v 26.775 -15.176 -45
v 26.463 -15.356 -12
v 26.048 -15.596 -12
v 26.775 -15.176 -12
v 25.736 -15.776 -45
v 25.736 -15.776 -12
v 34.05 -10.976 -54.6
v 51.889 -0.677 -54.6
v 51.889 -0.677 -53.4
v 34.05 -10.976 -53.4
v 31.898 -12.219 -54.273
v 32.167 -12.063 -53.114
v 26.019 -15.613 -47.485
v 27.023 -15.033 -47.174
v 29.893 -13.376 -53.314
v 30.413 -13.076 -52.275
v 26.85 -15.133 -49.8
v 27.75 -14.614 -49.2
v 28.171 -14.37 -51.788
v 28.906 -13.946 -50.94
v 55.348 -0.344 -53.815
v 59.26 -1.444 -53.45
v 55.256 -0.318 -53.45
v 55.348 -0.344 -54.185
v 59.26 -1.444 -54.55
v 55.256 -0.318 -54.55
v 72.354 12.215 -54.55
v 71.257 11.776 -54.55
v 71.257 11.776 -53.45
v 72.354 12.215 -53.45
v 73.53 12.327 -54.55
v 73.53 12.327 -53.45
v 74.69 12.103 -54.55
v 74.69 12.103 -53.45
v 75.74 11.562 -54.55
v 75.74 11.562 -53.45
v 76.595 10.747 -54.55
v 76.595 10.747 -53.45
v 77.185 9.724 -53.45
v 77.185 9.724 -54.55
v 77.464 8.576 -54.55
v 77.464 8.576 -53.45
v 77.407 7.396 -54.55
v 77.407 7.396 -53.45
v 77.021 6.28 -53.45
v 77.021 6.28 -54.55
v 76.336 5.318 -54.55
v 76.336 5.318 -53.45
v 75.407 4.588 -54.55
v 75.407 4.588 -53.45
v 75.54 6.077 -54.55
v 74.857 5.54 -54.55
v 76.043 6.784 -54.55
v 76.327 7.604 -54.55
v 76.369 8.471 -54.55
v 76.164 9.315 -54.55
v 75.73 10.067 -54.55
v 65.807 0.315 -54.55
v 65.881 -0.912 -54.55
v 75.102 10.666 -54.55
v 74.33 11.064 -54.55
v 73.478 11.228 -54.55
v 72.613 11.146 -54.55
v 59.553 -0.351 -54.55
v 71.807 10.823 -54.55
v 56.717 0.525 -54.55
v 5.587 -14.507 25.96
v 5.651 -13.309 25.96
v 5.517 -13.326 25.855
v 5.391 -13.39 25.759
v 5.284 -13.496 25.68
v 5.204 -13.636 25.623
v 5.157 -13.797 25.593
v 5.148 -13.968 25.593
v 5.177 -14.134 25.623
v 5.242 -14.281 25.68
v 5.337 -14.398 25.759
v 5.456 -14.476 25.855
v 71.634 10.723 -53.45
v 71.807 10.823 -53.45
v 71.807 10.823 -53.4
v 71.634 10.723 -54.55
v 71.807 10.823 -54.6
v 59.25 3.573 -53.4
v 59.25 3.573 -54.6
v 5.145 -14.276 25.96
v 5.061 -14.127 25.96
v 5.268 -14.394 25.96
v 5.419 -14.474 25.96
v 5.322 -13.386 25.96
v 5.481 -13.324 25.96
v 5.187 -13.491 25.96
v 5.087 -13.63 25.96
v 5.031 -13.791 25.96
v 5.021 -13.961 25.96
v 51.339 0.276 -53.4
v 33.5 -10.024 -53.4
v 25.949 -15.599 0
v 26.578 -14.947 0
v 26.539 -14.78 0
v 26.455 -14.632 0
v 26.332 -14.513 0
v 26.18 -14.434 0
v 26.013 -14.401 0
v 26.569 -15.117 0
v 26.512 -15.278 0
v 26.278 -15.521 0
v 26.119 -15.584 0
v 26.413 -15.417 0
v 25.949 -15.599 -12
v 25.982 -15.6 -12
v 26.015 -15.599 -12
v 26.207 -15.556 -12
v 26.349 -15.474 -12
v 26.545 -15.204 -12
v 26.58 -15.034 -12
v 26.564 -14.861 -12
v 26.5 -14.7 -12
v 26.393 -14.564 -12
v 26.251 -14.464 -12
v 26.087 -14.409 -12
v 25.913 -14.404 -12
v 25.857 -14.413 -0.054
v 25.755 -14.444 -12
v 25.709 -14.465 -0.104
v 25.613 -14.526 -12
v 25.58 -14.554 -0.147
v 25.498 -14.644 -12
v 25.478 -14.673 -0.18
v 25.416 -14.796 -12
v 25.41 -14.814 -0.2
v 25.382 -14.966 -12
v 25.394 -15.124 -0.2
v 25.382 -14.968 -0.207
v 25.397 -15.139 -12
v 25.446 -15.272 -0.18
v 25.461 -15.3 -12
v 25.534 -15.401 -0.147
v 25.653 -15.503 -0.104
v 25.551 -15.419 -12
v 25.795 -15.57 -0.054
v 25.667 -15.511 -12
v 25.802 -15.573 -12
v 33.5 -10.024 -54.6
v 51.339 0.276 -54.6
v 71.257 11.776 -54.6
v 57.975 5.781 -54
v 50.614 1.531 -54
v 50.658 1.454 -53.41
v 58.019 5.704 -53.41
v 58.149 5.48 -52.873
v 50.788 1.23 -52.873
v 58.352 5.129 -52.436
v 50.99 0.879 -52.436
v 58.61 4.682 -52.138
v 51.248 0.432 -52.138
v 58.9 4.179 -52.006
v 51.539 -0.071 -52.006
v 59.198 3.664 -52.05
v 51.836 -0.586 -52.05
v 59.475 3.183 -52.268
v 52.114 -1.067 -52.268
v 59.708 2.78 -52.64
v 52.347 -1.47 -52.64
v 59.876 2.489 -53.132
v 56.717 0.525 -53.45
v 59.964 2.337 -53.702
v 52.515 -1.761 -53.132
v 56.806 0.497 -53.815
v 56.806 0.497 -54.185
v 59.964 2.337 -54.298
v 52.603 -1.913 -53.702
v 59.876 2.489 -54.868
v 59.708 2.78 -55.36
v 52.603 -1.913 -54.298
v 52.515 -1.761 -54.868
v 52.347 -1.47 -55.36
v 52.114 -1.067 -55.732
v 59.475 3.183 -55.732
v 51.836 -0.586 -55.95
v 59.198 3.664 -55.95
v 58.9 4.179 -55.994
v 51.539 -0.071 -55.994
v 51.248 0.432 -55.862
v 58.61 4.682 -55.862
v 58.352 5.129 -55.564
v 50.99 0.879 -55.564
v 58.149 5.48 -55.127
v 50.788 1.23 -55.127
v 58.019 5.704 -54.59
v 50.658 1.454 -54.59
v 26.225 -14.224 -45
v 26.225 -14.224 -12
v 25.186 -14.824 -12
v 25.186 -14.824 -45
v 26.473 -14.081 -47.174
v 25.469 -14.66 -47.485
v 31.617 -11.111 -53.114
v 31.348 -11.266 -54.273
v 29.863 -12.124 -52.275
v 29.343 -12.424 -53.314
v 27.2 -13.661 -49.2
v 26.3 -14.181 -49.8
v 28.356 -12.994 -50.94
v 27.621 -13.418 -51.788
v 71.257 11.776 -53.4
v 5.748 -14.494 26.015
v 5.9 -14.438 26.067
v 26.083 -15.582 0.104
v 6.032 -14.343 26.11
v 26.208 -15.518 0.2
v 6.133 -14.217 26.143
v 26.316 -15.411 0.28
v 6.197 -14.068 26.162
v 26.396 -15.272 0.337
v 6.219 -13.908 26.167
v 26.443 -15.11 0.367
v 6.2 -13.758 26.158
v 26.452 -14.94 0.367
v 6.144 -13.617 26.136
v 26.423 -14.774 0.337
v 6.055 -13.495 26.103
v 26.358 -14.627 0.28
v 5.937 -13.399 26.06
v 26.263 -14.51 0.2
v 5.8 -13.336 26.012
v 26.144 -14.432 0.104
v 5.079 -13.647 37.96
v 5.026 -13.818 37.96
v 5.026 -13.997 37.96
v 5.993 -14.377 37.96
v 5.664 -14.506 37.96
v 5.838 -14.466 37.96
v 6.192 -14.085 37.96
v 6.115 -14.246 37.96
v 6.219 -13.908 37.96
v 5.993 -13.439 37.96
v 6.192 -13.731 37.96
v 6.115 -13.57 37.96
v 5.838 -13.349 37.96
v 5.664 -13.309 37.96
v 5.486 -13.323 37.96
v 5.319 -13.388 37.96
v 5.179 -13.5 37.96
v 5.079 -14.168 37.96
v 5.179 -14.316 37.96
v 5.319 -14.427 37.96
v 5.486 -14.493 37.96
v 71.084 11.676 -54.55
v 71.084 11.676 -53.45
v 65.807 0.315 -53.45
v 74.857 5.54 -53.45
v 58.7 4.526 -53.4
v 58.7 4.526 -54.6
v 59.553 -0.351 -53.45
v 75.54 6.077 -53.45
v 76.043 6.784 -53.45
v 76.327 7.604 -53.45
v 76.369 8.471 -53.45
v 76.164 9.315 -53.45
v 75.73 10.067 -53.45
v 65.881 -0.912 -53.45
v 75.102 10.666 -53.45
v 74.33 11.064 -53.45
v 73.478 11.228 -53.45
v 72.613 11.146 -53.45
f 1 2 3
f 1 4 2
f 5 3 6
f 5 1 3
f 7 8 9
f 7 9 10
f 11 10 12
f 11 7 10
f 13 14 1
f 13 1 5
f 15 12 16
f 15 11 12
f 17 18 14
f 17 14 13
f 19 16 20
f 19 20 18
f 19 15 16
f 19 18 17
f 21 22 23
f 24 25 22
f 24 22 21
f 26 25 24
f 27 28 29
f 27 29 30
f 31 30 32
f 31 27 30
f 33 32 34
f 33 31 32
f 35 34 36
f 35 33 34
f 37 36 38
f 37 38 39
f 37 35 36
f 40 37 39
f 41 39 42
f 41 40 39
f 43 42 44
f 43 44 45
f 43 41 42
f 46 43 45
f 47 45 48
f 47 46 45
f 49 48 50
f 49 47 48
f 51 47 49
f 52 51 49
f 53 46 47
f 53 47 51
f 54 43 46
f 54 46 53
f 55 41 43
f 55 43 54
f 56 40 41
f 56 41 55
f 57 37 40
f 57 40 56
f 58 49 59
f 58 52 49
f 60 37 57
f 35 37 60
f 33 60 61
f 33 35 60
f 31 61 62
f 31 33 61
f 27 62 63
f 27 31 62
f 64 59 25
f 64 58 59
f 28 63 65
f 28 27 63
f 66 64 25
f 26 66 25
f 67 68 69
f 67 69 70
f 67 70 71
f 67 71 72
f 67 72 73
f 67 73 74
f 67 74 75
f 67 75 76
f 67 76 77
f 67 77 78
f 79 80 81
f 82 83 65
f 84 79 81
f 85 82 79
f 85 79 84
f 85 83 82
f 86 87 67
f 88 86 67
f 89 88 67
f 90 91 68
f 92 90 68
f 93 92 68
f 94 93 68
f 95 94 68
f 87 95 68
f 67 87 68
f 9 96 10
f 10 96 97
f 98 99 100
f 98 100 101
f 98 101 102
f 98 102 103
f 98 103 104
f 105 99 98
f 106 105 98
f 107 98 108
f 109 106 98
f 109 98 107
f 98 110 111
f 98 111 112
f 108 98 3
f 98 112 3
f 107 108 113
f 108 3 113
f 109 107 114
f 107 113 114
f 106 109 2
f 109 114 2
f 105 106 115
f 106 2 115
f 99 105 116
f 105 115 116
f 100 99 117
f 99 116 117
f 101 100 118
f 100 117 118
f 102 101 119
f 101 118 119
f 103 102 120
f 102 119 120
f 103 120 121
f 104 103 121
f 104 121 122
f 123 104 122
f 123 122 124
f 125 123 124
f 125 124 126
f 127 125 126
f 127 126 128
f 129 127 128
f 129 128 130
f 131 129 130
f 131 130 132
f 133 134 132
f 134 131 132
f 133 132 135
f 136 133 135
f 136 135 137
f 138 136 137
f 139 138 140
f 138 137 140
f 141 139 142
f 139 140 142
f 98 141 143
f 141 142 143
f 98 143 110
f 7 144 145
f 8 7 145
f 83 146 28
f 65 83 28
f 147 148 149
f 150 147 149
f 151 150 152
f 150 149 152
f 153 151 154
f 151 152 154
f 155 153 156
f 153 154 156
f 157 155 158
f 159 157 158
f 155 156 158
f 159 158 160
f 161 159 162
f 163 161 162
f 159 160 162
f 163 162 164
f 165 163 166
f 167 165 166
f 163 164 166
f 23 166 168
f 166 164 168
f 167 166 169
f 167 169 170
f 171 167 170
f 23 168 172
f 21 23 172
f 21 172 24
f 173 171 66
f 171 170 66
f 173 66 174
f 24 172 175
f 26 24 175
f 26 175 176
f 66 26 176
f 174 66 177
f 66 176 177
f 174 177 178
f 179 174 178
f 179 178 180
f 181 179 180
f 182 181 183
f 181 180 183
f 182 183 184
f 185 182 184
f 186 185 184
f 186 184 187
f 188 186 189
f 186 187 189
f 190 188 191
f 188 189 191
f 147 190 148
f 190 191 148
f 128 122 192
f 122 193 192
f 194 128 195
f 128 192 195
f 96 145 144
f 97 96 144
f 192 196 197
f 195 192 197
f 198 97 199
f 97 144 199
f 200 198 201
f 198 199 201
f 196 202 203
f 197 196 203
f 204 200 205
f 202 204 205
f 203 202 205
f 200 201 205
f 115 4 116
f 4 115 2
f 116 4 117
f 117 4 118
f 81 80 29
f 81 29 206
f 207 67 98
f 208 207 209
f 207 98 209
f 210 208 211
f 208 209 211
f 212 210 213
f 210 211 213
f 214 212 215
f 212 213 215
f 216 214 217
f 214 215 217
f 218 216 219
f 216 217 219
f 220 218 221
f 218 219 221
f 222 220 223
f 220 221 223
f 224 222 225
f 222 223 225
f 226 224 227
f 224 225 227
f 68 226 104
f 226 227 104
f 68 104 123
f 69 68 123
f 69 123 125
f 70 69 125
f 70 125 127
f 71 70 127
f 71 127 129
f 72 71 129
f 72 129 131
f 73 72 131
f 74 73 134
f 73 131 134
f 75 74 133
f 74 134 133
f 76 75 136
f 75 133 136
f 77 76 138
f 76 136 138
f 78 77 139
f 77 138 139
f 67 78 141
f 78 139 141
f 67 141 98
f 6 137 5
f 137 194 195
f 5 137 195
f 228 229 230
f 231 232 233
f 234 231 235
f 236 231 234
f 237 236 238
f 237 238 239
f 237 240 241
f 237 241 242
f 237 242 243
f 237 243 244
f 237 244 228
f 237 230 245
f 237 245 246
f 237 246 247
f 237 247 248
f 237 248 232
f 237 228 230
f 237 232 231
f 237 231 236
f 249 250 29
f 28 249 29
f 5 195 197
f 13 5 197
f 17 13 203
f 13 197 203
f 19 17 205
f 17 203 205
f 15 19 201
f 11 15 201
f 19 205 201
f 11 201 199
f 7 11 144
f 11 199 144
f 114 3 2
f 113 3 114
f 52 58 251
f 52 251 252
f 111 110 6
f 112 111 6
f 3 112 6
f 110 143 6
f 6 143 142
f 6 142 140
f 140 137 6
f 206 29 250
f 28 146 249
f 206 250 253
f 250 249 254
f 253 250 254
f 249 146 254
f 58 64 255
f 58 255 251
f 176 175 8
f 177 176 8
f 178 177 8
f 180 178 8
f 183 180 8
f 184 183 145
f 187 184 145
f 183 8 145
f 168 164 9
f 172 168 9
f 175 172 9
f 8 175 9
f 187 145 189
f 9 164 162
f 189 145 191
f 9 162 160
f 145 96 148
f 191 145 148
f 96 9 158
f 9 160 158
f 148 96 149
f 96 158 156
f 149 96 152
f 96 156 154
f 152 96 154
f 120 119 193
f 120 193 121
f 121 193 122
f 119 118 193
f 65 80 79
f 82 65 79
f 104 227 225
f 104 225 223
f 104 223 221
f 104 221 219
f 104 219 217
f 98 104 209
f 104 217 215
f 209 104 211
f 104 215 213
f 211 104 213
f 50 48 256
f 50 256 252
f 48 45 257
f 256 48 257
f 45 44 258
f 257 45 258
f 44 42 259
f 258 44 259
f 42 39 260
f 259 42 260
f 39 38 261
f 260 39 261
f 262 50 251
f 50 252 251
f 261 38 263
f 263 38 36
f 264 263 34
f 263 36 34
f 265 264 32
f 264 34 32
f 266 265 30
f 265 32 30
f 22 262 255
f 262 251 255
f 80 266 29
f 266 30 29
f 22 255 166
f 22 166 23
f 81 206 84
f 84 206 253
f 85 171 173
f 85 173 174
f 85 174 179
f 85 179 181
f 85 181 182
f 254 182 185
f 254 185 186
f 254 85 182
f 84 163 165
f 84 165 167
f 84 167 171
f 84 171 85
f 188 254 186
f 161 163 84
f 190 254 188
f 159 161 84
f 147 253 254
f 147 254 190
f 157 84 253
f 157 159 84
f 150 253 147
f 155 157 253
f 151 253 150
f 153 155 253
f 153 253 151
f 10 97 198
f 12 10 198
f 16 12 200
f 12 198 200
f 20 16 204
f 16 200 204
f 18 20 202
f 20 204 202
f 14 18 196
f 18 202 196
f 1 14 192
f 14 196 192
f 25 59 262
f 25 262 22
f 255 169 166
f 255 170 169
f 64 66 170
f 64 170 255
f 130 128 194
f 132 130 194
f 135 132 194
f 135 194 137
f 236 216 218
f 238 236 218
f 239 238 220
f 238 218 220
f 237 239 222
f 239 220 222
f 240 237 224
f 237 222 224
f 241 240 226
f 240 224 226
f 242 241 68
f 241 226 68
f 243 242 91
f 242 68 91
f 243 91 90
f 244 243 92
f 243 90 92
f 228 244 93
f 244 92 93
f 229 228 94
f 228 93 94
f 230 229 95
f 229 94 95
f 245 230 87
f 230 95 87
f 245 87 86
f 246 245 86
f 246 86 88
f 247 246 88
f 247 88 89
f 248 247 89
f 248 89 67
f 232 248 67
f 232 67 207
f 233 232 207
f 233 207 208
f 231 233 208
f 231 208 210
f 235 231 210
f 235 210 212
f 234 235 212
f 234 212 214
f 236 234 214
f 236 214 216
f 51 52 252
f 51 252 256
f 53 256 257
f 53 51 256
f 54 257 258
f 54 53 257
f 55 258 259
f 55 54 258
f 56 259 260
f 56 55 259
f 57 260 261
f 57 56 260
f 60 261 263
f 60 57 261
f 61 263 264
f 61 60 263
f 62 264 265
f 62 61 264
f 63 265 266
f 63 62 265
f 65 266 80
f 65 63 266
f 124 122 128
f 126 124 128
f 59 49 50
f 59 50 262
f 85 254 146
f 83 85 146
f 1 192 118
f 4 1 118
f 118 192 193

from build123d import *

# Parameters (mm, degrees)
S01_TENDON_CAPTIVE_TAIL_R                      = 0.6
F_01_TENDON_CAPTIVE_TAIL_DEPTH                 = 12
S02_CROSSED_TENDON_R                           = 0.6
F_02_CROSSED_TENDON_DEPTH                      = 33.010681761
S03_TENDON_THROUGH_REAR_GROMMET_R              = 0.6
F_03_TENDON_THROUGH_REAR_GROMMET_DEPTH         = 12
F_04_START                                     = -0.55
F_04_TENDON_RETURN_DEPTH                       = 1.1
F_05_START                                     = -0.55
F_05_REMOVABLE_BACKED_EYE_AROUND_POLISHE_DEPTH = 1.1
S06_DRESSED_EYE_KNOT_ENVELOPE_R                = 2
F_06_DRESSED_EYE_KNOT_ENVELOPE_DEPTH           = 8.5


with BuildPart() as part:
    # S01 - Tendon captive tail → 01 - Tendon captive tail (new body)
    with BuildSketch(Plane.XY.offset(25.959868809)):
        with Locations((5.619098901, -13.907757819)):
            Circle(S01_TENDON_CAPTIVE_TAIL_R)
    extrude(amount=F_01_TENDON_CAPTIVE_TAIL_DEPTH)

    # S02 - Crossed tendon → 02 - Crossed tendon (add)
    with BuildSketch(Plane(origin=(10.190970454, -0.54666496, -12.992860813), x_dir=(0.7871038979441459, 0.025929320968004606, 0.6162752016390648), z_dir=(-0.6168204388970357, 0.0330875378277926, 0.7864081389452698))):
        with Locations(Location((20.060619317, -14.986740778, 0), (0, 0, 266.097812634))):
            Circle(S02_CROSSED_TENDON_R)
    extrude(amount=F_02_CROSSED_TENDON_DEPTH)

    # S03 - Tendon through rear grommet → 03 - Tendon through rear grommet (add)
    with BuildSketch(Plane.XY.offset(-12)):
        with Locations(Location((25.980762114, -15, 0), (0, 0, 266.929477468))):
            Circle(S03_TENDON_THROUGH_REAR_GROMMET_R)
    extrude(amount=F_03_TENDON_THROUGH_REAR_GROMMET_DEPTH)

    # S04 - Tendon return → 04 - Tendon return (add)
    with BuildSketch(Plane(origin=(12.990381057, -22.5, 0), x_dir=(-0.8660254037844386, -0.5000000000000003, 0), z_dir=(0.5000000000000003, -0.8660254037844386, 0)).offset(F_04_START)):
        with BuildLine():
            Line((-14.4, 12), (-14.4, 45))
            ThreePointArc((-14.4, 45), (-17.211774901, 51.788225099), (-24, 54.6))
            Line((-24, 54.6), (-67.598500564, 54.6))
            Line((-67.598500564, 54.6), (-67.598500564, 53.4))
            Line((-67.598500564, 53.4), (-24, 53.4))
            ThreePointArc((-24, 53.4), (-18.060303038, 50.939696962), (-15.6, 45))
            Line((-15.6, 45), (-15.6, 12))
            Line((-15.6, 12), (-14.4, 12))
        make_face()
    extrude(amount=F_04_TENDON_RETURN_DEPTH)

    # S05 - Removable backed eye around polished clevis sleeve → 05 - Removable backed eye around polished clevis sleeve (add)
    with BuildSketch(Plane.XY.offset(-54).offset(F_05_START)):
        with BuildLine():
            Line((71.084194722, 11.675564254), (71.257399803, 11.775564254))
            ThreePointArc((71.257399803, 11.775564254), (76.926405229, 10.256558829), (75.407399803, 4.587553403))
            Line((75.407399803, 4.587553403), (65.881120362, -0.912446597))
            Line((65.881120362, -0.912446597), (59.259967939, -1.444274196))
            Line((59.259967939, -1.444274196), (53.745866324, 0.106429959))
            Line((53.745866324, 0.106429959), (54.211891727, 1.299250282))
            Line((54.211891727, 1.299250282), (59.552788262, -0.351453873))
            Line((59.552788262, -0.351453873), (65.807434334, 0.315181347))
            Line((65.807434334, 0.315181347), (74.857399803, 5.540181347))
            ThreePointArc((74.857399803, 5.540181347), (75.973777285, 9.706558829), (71.807399803, 10.82293631))
            Line((71.807399803, 10.82293631), (71.634194722, 10.72293631))
            Line((71.634194722, 10.72293631), (71.084194722, 11.675564254))
        make_face()
    extrude(amount=F_05_REMOVABLE_BACKED_EYE_AROUND_POLISHE_DEPTH)

    # S06 - Dressed eye knot envelope → 06 - Dressed eye knot envelope (add)
    with BuildSketch(Plane(origin=(38.623434459, 22.299250282, 0), x_dir=(0, 0, -1), z_dir=(0.8660254037844386, 0.5000000000000003, 0))):
        with Locations(Location((54, -25.980762114, 0), (0, 0, 90))):
            Circle(S06_DRESSED_EYE_KNOT_ENVELOPE_R)
    extrude(amount=F_06_DRESSED_EYE_KNOT_ENVELOPE_DEPTH)


solid = part.part
